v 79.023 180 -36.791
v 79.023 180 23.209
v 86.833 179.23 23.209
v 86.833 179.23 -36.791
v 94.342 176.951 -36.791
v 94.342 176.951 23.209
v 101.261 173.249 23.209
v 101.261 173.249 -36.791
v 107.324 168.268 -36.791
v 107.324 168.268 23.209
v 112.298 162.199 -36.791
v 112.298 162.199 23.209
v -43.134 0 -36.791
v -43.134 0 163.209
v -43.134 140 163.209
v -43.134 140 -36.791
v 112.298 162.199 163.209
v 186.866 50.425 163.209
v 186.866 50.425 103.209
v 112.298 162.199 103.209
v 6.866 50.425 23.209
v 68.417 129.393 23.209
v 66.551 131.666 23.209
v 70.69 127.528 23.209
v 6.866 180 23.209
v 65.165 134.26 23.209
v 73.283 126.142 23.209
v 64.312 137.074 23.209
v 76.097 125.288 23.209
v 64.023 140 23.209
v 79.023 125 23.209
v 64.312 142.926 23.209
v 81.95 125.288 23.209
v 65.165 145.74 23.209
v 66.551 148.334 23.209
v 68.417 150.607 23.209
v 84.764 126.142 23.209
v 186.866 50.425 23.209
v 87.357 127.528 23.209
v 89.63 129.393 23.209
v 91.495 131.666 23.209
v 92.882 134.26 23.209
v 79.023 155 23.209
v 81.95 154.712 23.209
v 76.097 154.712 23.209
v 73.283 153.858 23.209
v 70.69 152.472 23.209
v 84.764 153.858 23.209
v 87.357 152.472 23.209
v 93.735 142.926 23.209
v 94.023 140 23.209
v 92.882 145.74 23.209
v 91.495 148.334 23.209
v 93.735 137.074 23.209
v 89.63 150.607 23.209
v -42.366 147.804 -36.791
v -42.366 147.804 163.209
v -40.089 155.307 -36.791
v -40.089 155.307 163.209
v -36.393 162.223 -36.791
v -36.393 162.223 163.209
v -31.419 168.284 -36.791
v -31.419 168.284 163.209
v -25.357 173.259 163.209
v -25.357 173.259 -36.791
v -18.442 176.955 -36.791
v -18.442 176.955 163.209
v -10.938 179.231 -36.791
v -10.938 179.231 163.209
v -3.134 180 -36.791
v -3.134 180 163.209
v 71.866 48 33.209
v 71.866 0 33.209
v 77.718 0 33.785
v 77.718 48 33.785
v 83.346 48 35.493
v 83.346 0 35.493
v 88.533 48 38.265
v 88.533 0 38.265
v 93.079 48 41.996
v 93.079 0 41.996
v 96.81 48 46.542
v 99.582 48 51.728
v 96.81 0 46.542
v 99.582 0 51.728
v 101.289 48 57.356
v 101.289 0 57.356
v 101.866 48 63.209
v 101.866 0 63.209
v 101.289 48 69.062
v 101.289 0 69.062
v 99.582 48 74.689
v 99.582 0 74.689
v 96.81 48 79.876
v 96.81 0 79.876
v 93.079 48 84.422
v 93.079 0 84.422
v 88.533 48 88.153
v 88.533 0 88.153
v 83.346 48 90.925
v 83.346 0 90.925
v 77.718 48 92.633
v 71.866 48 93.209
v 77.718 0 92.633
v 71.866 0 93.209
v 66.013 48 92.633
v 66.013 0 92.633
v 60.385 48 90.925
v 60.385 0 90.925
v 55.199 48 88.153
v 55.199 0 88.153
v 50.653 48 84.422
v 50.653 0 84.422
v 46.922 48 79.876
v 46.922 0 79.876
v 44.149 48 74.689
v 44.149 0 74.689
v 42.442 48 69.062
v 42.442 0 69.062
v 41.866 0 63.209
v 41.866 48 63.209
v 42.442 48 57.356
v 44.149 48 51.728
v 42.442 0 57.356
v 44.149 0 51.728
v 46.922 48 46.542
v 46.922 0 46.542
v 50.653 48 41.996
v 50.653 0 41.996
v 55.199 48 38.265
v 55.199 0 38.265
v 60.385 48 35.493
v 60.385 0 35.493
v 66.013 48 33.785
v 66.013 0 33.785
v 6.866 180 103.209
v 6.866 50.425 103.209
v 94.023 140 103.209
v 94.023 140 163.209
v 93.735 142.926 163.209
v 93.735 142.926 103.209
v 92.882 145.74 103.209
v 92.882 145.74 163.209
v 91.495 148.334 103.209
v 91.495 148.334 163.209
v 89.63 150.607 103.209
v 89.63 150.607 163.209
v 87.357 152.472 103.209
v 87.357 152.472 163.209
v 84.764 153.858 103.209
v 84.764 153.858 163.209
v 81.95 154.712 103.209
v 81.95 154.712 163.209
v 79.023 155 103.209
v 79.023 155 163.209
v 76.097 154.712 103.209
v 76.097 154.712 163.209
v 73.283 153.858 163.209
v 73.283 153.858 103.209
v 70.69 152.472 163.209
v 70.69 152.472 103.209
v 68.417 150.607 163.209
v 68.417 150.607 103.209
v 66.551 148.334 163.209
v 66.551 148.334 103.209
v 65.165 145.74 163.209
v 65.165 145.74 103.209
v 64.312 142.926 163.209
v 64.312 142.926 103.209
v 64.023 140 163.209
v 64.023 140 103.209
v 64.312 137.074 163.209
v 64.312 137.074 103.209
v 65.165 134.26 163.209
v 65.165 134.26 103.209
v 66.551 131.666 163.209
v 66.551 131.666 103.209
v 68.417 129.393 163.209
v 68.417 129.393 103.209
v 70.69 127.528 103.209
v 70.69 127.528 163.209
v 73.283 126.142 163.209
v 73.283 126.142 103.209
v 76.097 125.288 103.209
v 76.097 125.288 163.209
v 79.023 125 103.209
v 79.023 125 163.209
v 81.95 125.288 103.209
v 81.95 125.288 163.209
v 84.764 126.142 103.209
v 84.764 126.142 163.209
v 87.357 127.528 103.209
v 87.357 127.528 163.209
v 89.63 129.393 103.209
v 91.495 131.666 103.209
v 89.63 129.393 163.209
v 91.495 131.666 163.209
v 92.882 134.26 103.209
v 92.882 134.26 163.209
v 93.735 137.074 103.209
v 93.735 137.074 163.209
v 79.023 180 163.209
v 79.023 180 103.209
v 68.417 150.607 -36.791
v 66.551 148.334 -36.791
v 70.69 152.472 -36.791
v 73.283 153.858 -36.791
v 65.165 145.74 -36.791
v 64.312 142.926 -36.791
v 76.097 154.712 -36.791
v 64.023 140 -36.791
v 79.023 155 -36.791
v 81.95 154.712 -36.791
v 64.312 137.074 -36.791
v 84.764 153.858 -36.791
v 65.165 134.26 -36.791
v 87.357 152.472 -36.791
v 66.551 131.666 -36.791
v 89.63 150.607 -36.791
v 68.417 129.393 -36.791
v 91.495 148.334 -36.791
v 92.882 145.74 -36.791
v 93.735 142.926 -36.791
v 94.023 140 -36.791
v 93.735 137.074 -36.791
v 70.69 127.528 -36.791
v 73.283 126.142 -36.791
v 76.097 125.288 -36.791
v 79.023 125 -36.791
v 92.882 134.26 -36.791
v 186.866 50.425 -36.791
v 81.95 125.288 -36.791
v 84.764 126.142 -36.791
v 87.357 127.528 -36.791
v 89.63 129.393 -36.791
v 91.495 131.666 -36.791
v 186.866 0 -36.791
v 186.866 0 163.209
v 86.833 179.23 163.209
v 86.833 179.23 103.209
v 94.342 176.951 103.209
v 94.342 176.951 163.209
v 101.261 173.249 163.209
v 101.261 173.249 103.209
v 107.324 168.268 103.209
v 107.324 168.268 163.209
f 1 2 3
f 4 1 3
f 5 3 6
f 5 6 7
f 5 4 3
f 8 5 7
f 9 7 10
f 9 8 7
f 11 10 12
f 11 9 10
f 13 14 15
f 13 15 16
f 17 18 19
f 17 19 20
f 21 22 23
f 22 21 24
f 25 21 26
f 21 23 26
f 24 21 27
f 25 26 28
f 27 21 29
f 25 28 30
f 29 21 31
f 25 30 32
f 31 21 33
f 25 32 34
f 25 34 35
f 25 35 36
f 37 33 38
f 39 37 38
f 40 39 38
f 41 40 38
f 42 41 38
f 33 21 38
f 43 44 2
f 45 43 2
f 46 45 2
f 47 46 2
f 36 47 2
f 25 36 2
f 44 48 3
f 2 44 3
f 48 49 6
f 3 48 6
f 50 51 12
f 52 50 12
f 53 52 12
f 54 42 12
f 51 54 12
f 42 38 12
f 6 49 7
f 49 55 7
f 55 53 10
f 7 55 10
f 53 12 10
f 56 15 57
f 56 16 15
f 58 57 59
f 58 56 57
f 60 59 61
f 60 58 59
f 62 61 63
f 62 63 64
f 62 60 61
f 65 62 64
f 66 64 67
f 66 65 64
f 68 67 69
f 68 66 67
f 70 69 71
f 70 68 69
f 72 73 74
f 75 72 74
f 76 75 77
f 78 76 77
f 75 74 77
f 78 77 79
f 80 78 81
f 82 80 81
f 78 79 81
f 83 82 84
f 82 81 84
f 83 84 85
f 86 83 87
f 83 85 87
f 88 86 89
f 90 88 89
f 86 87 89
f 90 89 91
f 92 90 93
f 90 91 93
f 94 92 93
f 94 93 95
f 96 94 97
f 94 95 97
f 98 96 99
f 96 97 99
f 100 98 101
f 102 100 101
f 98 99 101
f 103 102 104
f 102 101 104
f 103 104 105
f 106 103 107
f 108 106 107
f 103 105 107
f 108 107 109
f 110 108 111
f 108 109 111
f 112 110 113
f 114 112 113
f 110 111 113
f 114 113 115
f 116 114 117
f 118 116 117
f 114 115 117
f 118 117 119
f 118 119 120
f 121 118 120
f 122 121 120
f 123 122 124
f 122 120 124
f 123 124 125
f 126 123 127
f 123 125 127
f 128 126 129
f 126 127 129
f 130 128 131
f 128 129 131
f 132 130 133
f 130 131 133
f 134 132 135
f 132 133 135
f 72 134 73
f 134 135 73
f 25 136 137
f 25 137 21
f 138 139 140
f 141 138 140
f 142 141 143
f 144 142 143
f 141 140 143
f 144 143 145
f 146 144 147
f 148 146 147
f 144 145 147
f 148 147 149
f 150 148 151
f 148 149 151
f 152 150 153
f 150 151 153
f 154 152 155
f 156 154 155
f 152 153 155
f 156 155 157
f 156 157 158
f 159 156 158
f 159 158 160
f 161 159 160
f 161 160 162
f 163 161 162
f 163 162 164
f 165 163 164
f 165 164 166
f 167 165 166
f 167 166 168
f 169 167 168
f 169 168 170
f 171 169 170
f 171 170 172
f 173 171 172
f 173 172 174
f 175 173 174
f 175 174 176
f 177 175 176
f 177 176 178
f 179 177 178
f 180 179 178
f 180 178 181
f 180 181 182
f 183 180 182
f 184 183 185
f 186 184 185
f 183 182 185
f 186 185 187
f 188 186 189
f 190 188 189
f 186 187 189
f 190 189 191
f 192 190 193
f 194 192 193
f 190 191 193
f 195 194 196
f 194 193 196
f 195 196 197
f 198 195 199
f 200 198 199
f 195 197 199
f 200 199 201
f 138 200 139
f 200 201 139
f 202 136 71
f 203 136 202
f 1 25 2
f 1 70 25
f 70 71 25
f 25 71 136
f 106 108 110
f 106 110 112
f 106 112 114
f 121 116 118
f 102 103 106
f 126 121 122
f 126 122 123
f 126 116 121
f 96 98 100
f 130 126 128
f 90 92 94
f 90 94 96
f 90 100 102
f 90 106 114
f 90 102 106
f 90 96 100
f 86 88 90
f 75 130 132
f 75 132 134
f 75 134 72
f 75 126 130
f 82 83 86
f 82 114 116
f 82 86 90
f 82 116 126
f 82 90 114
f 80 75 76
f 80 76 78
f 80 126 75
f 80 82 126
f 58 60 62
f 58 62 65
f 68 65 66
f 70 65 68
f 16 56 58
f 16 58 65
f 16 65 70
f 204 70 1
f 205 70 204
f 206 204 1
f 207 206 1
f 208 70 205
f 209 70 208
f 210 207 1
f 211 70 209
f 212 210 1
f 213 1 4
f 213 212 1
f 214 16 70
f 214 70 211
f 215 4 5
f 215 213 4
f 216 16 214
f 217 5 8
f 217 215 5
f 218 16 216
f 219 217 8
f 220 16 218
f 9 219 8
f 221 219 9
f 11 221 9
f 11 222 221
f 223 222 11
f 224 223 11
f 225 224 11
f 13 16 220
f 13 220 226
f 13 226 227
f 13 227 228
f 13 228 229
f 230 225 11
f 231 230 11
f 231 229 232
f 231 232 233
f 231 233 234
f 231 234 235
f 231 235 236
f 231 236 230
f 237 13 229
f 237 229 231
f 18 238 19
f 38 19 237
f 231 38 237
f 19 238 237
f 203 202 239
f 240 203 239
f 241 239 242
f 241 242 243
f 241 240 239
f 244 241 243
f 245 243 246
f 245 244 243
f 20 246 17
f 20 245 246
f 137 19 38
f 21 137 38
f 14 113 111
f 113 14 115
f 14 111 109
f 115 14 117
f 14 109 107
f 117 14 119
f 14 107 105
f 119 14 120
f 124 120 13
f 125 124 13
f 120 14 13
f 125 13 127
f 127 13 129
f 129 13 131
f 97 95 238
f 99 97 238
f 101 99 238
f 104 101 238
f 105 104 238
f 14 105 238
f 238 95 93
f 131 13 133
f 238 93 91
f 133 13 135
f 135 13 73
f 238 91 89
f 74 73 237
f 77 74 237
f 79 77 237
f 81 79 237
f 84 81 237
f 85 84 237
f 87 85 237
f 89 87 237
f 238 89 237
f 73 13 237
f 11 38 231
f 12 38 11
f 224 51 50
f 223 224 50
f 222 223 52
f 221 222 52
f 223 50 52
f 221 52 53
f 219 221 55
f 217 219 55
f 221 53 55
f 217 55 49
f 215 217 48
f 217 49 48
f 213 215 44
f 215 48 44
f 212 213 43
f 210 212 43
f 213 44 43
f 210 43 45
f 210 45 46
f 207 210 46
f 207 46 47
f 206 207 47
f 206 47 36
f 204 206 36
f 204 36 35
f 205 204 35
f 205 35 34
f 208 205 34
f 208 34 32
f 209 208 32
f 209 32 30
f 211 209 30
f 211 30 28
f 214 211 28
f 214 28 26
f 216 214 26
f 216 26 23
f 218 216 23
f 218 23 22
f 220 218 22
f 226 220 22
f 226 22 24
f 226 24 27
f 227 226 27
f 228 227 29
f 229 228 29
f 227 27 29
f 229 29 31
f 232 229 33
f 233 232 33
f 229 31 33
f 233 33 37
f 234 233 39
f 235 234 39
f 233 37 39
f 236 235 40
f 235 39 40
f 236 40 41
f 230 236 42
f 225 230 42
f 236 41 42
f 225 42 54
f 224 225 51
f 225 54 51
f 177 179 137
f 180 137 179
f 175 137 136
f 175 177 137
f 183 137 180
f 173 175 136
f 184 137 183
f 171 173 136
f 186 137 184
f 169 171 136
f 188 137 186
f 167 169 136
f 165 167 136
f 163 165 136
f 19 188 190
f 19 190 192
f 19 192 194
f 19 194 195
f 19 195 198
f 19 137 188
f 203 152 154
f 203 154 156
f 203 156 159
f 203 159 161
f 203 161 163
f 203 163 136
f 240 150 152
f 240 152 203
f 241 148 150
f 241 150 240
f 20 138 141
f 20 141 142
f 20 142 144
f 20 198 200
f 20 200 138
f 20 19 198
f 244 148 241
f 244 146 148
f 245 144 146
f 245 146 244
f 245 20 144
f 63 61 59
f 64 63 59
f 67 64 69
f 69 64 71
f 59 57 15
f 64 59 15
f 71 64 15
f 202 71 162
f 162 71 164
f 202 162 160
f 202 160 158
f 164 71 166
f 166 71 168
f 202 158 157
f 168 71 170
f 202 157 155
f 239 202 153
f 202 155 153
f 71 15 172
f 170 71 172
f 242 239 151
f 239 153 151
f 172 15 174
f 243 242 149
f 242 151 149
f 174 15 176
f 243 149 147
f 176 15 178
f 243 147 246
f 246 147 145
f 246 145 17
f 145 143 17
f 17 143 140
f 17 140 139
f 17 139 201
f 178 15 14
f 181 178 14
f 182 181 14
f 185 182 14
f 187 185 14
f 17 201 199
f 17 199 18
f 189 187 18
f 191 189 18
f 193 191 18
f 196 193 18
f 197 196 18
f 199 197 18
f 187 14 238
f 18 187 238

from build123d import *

# Parameters (mm, degrees)
SKETCH2_W           = 230
SKETCH2_H           = 200
BOSS_EXTRUDE1_DEPTH = 180
CUT_EXTRUDE1_DEPTH  = 200
FILLET2_R           = 40
SKETCH4_R           = 30
CUT_EXTRUDE2_DEPTH  = 48
SKETCH5_W           = 80
SKETCH5_H           = 129.575317766
CUT_EXTRUDE3_DEPTH  = 180
SKETCH6_R           = 15
CUT_EXTRUDE5_DEPTH  = 200


with BuildPart() as part:
    # Sketch2 → Boss-Extrude1 (new body)
    with BuildSketch(Plane(origin=(0, 0, 0), x_dir=(1, 0, 0), z_dir=(0, 1, 0))):
        with Locations((71.865714122, -63.208991457)):
            Rectangle(SKETCH2_W, SKETCH2_H)
    extrude(amount=BOSS_EXTRUDE1_DEPTH)

    # Sketch3 → Cut-Extrude1 (cut)
    with BuildSketch(Plane.XY.offset(163.208991457)):
        Polygon((100.422581047, 180), (186.865714122, 180), (186.865714122, 50.424682234), align=None)
    extrude(amount=-CUT_EXTRUDE1_DEPTH, mode=Mode.SUBTRACT)

    # Fillet2
    fillet2_edges = [part.edges().sort_by_distance(p)[0] for p in [
        (100.422581047, 180, 63.208991457),
        (-43.134285878, 180, 63.208991457),
    ]]
    fillet(fillet2_edges, radius=FILLET2_R)

    # Sketch4 → Cut-Extrude2 (cut)
    with BuildSketch(Plane.XZ):
        with Locations(Location((71.865714122, 63.208991457, 0), (0, 0, 270))):
            Circle(SKETCH4_R)
    extrude(amount=-CUT_EXTRUDE2_DEPTH, mode=Mode.SUBTRACT)

    # Sketch5 → Cut-Extrude3 (cut)
    with BuildSketch(Plane(origin=(186.865714122, 0, 0), x_dir=(0, 0, -1), z_dir=(1, 0, 0))):
        with Locations((-63.208991457, 115.212341117)):
            Rectangle(SKETCH5_W, SKETCH5_H)
    extrude(amount=-CUT_EXTRUDE3_DEPTH, mode=Mode.SUBTRACT)

    # Sketch6 → Cut-Extrude5 (cut)
    with BuildSketch(Plane.XY.offset(163.208991457)):
        with Locations((79.023419486, 140)):
            Circle(SKETCH6_R)
    extrude(amount=-CUT_EXTRUDE5_DEPTH, mode=Mode.SUBTRACT)


solid = part.part
